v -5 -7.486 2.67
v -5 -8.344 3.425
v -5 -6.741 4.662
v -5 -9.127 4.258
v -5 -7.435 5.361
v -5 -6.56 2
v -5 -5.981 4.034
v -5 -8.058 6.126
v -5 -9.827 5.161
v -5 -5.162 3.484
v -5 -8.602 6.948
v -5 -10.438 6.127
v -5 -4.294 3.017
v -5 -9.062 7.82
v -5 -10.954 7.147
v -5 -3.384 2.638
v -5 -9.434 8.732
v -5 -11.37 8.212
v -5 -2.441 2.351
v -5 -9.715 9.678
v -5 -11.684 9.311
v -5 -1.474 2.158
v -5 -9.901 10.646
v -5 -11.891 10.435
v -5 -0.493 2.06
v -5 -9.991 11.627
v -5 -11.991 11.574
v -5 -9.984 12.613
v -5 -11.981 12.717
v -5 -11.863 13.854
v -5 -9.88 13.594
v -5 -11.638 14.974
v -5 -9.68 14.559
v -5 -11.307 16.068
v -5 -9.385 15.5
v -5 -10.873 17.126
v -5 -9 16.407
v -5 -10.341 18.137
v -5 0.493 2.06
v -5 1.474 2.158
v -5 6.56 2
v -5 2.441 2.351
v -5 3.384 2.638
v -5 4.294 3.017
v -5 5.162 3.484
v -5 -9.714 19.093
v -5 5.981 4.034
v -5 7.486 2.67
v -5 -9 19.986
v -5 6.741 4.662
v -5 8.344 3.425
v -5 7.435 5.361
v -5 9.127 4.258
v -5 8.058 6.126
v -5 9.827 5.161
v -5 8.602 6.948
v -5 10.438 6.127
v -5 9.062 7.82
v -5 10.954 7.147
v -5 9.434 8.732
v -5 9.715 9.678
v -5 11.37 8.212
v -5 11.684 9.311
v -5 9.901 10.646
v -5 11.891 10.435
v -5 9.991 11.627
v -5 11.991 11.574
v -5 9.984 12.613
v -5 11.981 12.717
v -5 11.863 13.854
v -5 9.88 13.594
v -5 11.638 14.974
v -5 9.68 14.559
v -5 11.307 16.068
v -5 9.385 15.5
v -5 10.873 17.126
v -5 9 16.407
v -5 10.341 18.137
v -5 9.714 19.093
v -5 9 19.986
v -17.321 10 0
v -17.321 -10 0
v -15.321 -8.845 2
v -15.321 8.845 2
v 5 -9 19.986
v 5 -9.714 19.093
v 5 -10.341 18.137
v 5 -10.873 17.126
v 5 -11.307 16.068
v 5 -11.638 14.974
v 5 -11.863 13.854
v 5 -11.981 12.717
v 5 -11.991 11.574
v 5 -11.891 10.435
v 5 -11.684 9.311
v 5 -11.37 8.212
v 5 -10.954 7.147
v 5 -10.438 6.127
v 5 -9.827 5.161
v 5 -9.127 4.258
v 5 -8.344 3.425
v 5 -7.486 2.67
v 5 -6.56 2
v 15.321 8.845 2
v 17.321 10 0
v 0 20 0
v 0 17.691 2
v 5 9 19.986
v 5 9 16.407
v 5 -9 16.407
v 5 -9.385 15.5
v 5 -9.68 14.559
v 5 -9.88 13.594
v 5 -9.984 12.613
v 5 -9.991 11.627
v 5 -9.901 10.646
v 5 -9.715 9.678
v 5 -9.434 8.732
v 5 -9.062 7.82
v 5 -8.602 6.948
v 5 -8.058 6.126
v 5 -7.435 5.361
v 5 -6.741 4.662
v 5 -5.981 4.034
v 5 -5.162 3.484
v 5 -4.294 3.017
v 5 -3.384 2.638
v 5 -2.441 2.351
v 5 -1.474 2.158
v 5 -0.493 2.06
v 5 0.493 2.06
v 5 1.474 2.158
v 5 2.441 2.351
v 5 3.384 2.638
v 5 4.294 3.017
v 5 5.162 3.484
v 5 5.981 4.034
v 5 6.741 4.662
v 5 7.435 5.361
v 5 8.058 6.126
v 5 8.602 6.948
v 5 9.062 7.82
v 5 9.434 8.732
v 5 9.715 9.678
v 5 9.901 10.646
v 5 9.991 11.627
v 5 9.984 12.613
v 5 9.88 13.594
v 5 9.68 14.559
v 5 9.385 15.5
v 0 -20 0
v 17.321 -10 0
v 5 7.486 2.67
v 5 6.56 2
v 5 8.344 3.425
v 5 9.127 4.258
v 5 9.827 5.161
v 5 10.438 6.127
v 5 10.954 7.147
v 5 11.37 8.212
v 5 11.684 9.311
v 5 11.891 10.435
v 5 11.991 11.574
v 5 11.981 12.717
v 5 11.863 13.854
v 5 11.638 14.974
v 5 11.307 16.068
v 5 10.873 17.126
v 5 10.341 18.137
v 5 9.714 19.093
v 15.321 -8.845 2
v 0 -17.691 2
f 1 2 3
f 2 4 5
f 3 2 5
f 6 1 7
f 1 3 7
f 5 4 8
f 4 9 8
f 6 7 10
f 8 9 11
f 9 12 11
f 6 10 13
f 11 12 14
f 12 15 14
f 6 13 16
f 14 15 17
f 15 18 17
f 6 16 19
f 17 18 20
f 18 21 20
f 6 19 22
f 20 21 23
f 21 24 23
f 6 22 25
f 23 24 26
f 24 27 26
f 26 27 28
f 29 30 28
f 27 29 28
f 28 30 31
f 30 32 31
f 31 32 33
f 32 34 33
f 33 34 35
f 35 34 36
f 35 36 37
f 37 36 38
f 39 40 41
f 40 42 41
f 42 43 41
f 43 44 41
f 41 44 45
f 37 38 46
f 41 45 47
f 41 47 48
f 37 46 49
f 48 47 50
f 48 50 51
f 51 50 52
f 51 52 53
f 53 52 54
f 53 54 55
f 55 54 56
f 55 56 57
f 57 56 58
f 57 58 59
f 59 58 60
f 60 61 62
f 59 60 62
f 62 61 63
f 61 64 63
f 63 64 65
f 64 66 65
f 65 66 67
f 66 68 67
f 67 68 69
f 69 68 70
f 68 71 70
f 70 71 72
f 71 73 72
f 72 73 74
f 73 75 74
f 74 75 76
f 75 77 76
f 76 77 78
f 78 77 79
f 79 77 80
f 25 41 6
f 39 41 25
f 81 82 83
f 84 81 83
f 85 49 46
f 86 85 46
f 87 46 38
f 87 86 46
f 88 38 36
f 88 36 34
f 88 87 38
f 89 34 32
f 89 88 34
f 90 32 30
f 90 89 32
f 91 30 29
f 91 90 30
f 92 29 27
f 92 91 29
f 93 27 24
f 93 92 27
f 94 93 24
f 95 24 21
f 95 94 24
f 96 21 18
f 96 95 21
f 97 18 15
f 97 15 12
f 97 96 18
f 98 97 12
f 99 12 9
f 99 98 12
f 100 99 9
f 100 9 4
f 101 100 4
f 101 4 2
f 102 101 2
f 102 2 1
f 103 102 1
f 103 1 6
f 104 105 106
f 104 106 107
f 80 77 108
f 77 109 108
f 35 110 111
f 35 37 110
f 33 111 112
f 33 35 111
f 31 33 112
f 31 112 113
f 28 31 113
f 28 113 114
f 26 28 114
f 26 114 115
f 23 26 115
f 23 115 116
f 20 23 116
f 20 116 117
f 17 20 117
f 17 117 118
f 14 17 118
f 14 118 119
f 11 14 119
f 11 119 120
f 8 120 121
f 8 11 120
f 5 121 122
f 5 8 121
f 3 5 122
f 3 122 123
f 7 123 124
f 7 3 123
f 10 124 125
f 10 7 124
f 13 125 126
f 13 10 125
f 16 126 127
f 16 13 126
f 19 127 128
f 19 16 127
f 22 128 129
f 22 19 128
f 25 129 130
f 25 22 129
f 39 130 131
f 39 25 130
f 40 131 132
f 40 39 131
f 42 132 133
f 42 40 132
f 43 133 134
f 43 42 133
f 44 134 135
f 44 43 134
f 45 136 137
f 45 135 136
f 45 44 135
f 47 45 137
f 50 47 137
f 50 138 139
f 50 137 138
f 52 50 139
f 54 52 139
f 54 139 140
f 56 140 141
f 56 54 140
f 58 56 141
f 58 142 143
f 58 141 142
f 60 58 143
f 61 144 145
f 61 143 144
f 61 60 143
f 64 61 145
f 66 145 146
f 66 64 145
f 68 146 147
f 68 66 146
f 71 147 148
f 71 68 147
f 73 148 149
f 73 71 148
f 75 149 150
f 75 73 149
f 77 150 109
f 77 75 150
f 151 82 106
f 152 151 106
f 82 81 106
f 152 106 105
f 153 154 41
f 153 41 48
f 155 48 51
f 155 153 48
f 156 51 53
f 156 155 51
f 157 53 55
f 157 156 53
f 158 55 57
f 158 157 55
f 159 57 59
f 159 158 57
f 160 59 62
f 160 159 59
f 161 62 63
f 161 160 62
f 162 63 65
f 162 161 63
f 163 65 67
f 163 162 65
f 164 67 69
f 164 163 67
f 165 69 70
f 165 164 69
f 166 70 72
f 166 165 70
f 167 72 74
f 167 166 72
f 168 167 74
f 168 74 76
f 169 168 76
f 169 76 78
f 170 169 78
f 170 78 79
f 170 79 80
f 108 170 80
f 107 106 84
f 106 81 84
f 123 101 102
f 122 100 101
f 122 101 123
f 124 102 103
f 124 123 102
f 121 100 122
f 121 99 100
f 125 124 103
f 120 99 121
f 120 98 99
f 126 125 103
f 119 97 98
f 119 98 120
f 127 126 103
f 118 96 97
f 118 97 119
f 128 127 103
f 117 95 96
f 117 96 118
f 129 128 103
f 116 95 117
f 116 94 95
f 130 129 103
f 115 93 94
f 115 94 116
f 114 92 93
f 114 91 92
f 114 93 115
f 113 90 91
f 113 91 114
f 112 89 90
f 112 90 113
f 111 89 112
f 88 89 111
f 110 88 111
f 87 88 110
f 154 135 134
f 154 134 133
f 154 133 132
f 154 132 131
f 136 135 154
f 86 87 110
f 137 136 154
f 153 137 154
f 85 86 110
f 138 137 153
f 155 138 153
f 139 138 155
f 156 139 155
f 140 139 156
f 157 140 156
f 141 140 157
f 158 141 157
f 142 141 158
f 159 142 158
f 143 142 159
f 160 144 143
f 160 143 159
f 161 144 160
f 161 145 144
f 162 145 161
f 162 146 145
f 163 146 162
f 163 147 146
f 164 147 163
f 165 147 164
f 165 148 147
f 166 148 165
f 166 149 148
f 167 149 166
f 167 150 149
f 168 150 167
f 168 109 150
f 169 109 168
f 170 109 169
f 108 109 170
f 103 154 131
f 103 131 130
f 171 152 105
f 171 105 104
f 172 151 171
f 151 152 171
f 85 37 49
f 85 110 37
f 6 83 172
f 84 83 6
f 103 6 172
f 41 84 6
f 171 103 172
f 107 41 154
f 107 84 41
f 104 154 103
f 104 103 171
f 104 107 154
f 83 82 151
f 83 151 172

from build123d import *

# Parameters (mm, degrees)
F1_DEPTH = 2
F1_TAPER = 45
F2_R     = 12
F2_R_2   = 10
F3_DEPTH = 5
F4_W     = 18
F4_H     = 18
F5_DEPTH = 12.5


with BuildPart() as f1:
    # F0 (on Top) → F1 (new body)
    with BuildSketch(Plane.XY):
        Polygon((-17.3205080757, -10), (0, -20), (17.3205080757, -10), (17.3205080757, 10), (0, 20), (-17.3205080757, 10), align=None)
    extrude(amount=F1_DEPTH, taper=F1_TAPER)

    # F2 (on Right) → F3 (join, symmetric)
    with BuildSketch(Plane.YZ):
        with Locations((0, 12.0482798538)):
            Circle(F2_R)
        with Locations((0, 12.0482798538)):
            Circle(F2_R_2, mode=Mode.SUBTRACT)
    extrude(amount=F3_DEPTH, both=True)

    # F4 (on Right) → F5 (cut, symmetric)
    with BuildSketch(Plane.YZ):
        with Locations((0, 22.5956004525)):
            Rectangle(F4_W, F4_H)
    extrude(amount=F5_DEPTH, both=True, mode=Mode.SUBTRACT)


solid = f1.part
